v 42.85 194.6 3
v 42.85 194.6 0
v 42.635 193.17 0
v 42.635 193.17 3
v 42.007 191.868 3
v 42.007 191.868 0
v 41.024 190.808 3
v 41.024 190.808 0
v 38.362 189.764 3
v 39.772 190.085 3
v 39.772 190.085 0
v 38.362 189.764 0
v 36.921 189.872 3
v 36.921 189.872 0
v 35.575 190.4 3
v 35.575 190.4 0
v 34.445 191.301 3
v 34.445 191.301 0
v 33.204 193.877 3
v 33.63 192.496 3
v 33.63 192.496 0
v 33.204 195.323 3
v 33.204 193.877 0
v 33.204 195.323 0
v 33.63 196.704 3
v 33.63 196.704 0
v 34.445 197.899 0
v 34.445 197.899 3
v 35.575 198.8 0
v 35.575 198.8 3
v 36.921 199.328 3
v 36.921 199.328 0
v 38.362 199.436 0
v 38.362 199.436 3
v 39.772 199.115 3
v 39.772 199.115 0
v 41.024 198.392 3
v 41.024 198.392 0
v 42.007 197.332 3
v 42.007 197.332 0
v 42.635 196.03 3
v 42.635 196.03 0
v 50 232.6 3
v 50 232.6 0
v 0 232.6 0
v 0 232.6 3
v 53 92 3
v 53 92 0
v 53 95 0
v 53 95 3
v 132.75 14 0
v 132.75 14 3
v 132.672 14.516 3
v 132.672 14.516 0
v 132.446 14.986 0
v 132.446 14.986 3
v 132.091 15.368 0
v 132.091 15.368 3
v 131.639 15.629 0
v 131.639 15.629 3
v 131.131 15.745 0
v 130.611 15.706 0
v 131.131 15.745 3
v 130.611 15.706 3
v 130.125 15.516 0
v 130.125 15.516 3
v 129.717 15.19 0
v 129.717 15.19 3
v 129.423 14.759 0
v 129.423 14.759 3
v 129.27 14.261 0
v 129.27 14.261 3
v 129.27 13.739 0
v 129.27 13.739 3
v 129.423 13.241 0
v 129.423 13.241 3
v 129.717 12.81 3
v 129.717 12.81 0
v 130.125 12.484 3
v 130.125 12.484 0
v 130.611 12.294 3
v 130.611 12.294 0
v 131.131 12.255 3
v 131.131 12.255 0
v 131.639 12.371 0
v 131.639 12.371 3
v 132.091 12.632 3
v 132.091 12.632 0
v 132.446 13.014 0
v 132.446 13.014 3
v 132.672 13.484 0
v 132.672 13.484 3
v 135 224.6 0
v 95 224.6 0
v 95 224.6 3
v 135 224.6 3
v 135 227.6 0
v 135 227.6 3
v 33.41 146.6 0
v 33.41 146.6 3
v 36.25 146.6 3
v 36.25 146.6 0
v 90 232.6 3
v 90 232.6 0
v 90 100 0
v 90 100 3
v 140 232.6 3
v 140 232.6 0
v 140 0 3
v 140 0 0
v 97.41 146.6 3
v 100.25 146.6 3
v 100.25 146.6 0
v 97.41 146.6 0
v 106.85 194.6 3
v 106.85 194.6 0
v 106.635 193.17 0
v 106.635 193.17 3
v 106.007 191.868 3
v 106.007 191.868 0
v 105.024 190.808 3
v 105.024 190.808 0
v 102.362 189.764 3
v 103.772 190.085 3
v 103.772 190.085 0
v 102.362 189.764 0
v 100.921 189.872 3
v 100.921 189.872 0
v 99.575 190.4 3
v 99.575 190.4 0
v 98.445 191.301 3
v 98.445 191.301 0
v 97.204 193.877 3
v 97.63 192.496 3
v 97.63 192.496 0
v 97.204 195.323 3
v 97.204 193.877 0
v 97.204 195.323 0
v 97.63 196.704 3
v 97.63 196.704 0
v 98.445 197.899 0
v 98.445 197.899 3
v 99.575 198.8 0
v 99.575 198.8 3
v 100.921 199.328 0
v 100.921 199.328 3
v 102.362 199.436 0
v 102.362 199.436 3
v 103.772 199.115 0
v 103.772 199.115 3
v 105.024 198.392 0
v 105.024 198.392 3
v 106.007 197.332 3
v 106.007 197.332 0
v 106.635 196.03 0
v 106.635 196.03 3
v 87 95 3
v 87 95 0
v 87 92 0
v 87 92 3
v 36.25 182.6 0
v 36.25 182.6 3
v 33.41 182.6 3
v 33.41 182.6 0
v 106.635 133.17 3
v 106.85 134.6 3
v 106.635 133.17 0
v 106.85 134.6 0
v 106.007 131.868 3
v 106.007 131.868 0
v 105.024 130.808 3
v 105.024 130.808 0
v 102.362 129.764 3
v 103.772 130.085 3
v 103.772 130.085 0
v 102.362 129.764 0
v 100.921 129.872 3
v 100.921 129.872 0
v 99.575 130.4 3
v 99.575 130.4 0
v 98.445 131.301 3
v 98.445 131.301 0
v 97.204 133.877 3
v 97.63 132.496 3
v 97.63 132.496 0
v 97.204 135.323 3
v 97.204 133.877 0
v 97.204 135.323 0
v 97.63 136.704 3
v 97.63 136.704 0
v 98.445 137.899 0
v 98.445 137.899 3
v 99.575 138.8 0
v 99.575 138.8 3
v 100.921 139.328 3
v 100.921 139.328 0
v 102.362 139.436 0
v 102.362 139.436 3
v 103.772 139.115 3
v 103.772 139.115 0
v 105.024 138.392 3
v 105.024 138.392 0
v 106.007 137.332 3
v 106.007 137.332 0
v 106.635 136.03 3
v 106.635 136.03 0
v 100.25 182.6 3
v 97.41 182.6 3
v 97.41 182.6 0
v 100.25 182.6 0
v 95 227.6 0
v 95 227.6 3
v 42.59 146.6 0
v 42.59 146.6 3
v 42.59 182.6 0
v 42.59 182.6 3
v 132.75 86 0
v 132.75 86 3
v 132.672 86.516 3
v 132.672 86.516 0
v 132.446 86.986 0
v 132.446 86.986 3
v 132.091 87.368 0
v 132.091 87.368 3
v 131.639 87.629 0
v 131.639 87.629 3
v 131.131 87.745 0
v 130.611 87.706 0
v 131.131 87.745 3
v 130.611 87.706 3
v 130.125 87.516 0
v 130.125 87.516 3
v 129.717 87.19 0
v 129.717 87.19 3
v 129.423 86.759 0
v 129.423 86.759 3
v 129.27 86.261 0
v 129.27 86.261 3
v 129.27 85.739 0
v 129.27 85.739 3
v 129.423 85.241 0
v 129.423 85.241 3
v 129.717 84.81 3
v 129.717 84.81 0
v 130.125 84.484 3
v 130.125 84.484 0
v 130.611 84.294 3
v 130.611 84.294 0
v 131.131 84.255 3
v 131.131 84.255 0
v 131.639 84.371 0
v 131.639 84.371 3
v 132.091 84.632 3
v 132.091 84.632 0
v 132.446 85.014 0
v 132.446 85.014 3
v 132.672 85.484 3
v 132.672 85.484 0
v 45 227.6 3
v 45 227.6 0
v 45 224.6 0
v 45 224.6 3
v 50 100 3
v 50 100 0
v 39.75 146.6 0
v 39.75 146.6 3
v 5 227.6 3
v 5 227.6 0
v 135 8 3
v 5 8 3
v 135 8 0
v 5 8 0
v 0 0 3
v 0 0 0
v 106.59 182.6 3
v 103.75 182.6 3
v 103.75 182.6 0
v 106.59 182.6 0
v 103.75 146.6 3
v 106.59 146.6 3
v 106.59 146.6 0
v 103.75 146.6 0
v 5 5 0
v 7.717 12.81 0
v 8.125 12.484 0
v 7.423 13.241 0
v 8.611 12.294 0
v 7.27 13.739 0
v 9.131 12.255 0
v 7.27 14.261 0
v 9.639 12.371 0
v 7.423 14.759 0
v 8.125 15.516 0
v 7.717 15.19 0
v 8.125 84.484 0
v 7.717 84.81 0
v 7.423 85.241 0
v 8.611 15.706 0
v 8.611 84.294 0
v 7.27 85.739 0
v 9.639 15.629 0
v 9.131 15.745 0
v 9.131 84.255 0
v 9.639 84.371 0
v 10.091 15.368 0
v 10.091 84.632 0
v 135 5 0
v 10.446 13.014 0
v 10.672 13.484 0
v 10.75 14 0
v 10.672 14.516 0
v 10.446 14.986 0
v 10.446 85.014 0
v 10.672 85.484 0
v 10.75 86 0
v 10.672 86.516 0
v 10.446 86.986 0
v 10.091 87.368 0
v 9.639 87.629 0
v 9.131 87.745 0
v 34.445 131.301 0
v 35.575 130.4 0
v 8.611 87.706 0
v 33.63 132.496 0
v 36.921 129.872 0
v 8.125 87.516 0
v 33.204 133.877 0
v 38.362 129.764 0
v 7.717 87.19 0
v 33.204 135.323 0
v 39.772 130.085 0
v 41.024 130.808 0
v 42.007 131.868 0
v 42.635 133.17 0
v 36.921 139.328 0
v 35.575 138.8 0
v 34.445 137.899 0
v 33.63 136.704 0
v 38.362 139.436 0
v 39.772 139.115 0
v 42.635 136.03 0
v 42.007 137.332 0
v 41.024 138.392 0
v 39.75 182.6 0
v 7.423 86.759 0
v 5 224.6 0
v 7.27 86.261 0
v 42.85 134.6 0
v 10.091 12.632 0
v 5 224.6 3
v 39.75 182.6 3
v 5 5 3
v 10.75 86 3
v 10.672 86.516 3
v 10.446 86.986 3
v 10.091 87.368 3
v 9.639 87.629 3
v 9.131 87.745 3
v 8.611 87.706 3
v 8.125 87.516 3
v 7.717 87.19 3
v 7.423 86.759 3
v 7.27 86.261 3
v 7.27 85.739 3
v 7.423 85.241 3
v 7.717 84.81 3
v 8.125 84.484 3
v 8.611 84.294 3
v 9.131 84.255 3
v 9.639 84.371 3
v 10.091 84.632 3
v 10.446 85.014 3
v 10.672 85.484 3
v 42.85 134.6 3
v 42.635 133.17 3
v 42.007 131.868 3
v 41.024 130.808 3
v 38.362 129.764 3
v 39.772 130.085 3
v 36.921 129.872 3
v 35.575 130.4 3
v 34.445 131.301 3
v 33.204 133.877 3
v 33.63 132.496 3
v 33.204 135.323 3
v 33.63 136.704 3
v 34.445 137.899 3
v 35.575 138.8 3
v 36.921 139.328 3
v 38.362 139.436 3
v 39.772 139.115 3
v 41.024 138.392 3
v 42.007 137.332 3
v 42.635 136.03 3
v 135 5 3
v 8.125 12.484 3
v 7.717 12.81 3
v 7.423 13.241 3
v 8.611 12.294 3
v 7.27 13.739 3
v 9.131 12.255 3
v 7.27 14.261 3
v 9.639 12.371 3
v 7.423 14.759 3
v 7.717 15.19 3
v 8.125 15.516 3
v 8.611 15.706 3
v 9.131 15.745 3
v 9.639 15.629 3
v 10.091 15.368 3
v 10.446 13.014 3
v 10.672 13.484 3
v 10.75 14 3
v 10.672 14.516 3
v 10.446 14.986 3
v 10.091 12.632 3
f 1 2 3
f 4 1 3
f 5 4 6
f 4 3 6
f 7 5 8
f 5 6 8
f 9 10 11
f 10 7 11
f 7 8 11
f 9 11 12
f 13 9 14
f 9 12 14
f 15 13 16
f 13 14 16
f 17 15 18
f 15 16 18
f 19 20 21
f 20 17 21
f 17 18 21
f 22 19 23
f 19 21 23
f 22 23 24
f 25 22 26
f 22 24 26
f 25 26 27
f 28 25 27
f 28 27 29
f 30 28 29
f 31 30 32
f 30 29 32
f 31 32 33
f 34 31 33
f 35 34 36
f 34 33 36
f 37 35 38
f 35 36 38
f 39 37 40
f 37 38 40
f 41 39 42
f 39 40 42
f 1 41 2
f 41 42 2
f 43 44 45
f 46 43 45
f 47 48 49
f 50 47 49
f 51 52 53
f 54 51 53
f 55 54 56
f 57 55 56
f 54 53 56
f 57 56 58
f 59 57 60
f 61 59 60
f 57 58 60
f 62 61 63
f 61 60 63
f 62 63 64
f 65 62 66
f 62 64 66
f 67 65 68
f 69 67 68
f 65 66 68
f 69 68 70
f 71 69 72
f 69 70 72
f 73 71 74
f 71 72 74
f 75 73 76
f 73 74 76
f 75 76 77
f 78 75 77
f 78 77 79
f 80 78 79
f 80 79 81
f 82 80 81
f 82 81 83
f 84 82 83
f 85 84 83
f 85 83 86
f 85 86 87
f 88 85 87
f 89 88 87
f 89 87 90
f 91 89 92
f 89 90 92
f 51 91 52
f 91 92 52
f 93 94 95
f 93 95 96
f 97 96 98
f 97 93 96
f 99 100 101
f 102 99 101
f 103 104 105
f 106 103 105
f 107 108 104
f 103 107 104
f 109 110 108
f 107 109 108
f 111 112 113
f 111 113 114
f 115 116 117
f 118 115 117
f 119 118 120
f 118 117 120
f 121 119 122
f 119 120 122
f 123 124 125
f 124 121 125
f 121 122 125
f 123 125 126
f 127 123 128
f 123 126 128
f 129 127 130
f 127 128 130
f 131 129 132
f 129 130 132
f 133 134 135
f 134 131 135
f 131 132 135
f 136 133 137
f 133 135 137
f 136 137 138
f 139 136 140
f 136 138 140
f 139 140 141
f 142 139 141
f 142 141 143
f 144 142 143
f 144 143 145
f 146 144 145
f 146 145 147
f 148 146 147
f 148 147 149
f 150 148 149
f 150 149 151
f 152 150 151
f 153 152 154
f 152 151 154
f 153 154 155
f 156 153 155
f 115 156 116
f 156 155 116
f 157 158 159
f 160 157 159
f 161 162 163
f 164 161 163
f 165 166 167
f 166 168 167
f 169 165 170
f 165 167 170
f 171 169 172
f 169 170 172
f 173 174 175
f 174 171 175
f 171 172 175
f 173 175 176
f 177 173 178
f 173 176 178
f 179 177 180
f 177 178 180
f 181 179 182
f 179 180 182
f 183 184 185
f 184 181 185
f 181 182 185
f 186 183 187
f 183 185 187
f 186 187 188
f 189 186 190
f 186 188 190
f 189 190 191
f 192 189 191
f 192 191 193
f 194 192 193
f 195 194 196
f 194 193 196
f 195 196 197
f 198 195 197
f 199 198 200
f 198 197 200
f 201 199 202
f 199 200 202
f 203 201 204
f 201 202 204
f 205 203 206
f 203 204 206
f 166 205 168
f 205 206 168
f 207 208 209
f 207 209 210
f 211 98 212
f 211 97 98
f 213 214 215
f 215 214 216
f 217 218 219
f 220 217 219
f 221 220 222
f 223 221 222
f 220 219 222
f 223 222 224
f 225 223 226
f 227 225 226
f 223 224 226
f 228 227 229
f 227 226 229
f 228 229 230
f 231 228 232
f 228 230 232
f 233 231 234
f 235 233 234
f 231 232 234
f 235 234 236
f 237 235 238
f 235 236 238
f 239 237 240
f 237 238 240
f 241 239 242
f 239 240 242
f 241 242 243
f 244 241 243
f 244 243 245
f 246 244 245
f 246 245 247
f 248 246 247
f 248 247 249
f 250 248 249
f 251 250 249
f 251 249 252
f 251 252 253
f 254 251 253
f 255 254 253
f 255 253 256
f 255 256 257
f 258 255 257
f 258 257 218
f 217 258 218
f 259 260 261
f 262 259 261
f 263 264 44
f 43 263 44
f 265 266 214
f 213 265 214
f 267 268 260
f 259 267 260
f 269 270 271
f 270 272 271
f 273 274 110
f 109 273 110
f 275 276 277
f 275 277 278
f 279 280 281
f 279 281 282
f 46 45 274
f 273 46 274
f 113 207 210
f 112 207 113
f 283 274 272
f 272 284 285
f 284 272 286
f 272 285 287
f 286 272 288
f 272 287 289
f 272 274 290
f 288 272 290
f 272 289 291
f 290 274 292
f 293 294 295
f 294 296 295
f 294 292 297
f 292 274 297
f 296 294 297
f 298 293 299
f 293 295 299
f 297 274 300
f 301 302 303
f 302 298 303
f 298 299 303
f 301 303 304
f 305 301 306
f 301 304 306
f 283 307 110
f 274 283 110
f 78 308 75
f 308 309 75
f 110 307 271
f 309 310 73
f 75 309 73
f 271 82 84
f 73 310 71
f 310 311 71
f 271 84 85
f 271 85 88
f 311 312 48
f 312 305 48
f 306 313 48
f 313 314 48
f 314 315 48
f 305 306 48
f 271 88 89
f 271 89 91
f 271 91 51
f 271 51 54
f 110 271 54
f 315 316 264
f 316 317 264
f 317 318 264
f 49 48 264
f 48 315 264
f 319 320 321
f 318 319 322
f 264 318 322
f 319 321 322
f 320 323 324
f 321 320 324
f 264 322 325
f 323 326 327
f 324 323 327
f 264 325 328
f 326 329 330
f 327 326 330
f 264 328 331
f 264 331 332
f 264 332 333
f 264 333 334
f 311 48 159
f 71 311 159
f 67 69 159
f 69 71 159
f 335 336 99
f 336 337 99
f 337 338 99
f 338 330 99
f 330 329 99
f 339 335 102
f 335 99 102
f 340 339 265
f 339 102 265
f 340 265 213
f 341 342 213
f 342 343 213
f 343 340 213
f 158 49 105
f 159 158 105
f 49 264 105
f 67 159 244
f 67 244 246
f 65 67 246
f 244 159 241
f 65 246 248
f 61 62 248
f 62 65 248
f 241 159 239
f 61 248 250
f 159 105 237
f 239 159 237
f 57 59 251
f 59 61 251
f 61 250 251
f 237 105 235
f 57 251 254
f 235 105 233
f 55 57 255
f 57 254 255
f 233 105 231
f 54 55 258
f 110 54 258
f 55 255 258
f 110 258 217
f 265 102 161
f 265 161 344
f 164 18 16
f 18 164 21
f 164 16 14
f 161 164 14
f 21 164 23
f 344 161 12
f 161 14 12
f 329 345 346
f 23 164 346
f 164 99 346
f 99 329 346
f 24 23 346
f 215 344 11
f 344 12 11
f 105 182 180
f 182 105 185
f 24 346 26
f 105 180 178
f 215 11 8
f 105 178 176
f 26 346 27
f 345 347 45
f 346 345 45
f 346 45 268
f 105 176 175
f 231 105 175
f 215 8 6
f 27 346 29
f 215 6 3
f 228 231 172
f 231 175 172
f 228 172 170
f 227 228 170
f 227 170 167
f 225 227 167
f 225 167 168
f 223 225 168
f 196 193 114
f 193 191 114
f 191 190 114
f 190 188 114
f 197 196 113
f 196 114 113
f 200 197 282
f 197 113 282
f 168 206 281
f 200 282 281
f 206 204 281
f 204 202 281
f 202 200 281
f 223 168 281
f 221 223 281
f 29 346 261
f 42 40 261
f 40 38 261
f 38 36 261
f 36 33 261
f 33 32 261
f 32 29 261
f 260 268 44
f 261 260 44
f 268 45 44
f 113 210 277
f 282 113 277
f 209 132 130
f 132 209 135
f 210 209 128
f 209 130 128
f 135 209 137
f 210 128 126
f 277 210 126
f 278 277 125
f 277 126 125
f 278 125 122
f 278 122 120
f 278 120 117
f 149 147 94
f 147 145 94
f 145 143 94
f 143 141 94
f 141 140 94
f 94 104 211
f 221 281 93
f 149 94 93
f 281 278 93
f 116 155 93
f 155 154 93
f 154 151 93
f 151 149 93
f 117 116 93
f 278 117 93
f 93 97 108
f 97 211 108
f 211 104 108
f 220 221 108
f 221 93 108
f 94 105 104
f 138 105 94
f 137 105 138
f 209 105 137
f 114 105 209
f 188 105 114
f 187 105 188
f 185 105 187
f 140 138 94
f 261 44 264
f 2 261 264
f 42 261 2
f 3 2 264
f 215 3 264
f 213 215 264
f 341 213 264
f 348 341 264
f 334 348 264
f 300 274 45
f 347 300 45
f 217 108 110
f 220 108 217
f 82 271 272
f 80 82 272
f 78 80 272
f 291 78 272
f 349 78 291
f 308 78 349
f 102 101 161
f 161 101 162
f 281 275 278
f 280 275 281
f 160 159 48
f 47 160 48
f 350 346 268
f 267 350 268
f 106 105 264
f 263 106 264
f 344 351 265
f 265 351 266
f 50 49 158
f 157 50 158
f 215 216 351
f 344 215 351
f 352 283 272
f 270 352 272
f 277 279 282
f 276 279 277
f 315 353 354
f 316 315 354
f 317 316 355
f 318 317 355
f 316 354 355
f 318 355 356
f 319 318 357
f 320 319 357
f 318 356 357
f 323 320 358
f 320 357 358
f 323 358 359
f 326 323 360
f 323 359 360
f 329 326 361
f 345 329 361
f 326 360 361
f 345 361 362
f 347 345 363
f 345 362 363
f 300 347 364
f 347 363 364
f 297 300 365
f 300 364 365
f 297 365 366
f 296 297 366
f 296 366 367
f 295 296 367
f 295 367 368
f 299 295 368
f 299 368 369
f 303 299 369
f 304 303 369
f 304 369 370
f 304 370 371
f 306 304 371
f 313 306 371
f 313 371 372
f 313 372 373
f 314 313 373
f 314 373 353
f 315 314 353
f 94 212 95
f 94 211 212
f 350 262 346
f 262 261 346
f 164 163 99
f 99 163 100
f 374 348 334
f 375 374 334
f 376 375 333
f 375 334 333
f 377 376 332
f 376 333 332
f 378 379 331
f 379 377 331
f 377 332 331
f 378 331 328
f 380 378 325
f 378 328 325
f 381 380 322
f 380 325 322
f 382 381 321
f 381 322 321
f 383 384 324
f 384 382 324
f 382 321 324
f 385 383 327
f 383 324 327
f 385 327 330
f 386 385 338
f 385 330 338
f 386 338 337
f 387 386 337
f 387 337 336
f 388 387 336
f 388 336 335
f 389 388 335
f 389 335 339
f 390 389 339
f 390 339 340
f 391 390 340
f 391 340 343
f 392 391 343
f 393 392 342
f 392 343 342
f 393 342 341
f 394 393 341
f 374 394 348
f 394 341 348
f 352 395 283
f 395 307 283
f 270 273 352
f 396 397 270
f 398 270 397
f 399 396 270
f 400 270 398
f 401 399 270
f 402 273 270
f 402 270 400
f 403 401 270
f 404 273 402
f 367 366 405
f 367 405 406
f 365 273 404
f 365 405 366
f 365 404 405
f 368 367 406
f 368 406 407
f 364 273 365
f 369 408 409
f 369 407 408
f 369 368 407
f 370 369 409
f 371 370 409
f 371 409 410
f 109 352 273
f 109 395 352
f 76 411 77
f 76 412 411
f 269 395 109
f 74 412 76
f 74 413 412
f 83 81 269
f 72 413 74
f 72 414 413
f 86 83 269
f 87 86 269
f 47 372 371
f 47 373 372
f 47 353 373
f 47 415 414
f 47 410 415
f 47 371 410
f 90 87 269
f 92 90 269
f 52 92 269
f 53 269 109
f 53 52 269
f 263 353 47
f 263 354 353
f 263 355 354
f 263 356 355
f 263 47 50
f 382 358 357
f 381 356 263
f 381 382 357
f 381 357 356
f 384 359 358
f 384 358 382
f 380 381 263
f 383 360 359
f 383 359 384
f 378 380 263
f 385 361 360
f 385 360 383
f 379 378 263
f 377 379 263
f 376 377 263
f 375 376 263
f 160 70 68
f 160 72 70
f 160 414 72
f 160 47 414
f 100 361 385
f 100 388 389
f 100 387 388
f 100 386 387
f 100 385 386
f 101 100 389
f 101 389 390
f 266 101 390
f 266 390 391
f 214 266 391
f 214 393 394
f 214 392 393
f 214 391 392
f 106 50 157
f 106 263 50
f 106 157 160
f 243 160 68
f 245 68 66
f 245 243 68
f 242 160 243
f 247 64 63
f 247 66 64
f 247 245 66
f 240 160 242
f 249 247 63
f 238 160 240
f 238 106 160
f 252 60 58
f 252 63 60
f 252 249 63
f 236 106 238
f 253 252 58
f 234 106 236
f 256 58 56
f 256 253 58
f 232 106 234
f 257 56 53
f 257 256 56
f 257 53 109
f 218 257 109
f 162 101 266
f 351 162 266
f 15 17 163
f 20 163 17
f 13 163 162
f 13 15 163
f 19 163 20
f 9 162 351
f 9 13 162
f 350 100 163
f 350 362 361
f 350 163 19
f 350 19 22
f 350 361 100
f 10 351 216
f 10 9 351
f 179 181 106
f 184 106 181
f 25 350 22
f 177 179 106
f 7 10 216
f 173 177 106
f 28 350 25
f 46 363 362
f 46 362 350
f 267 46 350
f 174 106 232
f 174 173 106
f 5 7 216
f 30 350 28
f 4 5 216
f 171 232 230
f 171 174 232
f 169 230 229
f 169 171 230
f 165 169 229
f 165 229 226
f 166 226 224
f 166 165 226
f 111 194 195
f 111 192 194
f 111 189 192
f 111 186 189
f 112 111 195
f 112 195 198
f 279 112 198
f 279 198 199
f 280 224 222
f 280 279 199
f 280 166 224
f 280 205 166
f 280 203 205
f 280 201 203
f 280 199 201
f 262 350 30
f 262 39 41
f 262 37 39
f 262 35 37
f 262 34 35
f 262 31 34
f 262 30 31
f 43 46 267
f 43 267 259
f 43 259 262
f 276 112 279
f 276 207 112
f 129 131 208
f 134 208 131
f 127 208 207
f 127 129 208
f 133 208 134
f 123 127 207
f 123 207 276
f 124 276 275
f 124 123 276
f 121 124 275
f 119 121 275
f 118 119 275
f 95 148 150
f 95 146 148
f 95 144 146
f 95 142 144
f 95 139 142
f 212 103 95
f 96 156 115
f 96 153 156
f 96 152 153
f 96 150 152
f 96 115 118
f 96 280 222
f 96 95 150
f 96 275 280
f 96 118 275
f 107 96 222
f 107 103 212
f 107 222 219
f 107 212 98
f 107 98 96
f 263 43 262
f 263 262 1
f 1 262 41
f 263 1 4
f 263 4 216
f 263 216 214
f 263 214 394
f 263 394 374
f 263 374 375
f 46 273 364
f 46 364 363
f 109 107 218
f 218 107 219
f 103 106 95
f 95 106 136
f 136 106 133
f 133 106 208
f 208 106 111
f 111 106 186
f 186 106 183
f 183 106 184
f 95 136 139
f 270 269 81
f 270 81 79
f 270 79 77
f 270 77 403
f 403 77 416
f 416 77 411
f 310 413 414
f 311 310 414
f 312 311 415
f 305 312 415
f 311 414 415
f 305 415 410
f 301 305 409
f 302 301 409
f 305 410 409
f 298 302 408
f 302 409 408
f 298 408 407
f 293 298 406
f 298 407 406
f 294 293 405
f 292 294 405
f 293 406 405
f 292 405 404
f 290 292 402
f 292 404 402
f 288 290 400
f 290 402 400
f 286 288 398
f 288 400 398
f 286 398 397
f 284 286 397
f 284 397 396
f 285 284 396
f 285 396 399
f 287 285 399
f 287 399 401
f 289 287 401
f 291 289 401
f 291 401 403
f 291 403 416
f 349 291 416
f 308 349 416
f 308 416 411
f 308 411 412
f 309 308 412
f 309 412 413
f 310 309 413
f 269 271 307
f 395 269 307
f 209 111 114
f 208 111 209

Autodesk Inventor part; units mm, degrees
ref_plane "YZ Plane" through (0, 0, 0) normal (1, 0, 0) x (0, 1, 0)
ref_plane "XZ Plane" through (0, 0, 0) normal (0, 1, 0) x (-1, 0, 0)
ref_plane "XY Plane" through (0, 0, 0) normal (0, 0, 1) x (1, 0, 0)
sketch "Sketch1" plane through (0, 0, 0) normal (0, 0, 1) x (1, 0, 0)
  line L0 (0, 0) -> (140, 0)
  line L1 (140, 0) -> (140, 232.6)
  line L2 (140, 232.6) -> (90, 232.6)
  line L3 (90, 232.6) -> (90, 100)
  line L4 (90, 100) -> (50, 100)
  line L5 (50, 100) -> (50, 232.6)
  line L6 (50, 232.6) -> (0, 232.6)
  line L7 (0, 232.6) -> (0, 0)
  line L8 (70, 100) -> (70, 0) construction
  line L9 (30, 232.2963) -> (30, 0) construction
  circle A0 centre (38, 194.6) radius 4.85
  circle A1 centre (38, 134.6) radius 4.85
  circle A2 centre (102, 194.6) radius 4.85
  circle A3 centre (102, 134.6) radius 4.85
  circle A4 centre (30, 194.6) radius 14 construction
  circle A5 centre (30, 134.6) radius 14 construction
  line L10 (5, 227.6) -> (45, 227.6)
  line L11 (45, 227.6) -> (45, 224.6)
  line L12 (45, 224.6) -> (5, 224.6)
  line L13 (5, 224.6) -> (5, 227.6)
  line L14 (53, 95) -> (87, 95)
  line L15 (87, 95) -> (87, 92)
  line L16 (87, 92) -> (53, 92)
  line L17 (53, 92) -> (53, 95)
  line L18 (5, 8) -> (135, 8)
  line L19 (135, 8) -> (135, 5)
  line L20 (135, 5) -> (5, 5)
  line L21 (5, 5) -> (5, 8)
  line L22 (135, 227.6) -> (95, 227.6)
  line L23 (95, 227.6) -> (95, 224.6)
  line L24 (95, 224.6) -> (135, 224.6)
  line L25 (135, 224.6) -> (135, 227.6)
  line L26 (30, 194.6) -> (50, 194.6) construction
  line L27 (30, 134.6) -> (50, 134.6) construction
  circle A6 centre (30, 202.6) radius 4.5
  dimension "d0" = 40
  dimension "d2" = 132.6
  dimension "d3" = 100
  dimension "d4" = 9.7
  dimension "d6" = 60
  dimension "d10" = 28
  dimension "d11" = 8
  dimension "d12" = 8
  dimension "d13" = 5
  dimension "d14" = 5
  dimension "d15" = 5
  dimension "d16" = 3
  dimension "d17" = 3
  dimension "d18" = 5
  dimension "d19" = 3
  dimension "d20" = 3
  dimension "d21" = 5
  dimension "d22" = 5
  dimension "d23" = 5
  dimension "d24" = 3
  dimension "d32" = 9
  dimension "d33" = 8
  dimension "d34" = 30
  dimension "d39" = 20
  dimension "d40" = 50
extrude "Extrusion2" add sketch "Sketch1" along normal blind 3 contours L7 L6 L5 L4 L3 L2 L1 L0 | A6
sketch "Sketch2" plane through (0, 0, 3) normal (0, 0, 1) x (1, 0, 0)
  circle A0 centre (38, 194.6) radius 4.85 construction
  line L0 (50, 232.6) -> (0, 232.6) construction
  line L1 (50, 232.6) -> (0, 232.6) construction
  line L2 (36.25, 182.6) -> (33.41, 182.6)
  line L3 (33.41, 182.6) -> (33.41, 146.6)
  line L4 (33.41, 146.6) -> (36.25, 146.6)
  line L5 (36.25, 146.6) -> (36.25, 182.6)
  line L6 (90, 100) -> (50, 100) construction
  line L7 (70, 100) -> (70, 0) construction
  line L8 (39.75, 146.6) -> (42.59, 146.6)
  line L9 (42.59, 146.6) -> (42.59, 182.6)
  line L10 (42.59, 182.6) -> (39.75, 182.6)
  line L11 (39.75, 182.6) -> (39.75, 146.6)
  line L12 (103.75, 182.6) -> (106.59, 182.6)
  line L13 (106.59, 182.6) -> (106.59, 146.6)
  line L14 (106.59, 146.6) -> (103.75, 146.6)
  line L15 (103.75, 146.6) -> (103.75, 182.6)
  line L16 (100.25, 146.6) -> (97.41, 146.6)
  line L17 (97.41, 146.6) -> (97.41, 182.6)
  line L18 (97.41, 182.6) -> (100.25, 182.6)
  line L19 (100.25, 182.6) -> (100.25, 146.6)
  line L20 (33.41, 164.6) -> (7.5179, 164.6)
  circle A1 centre (38, 134.6) radius 4.85 construction
  line L21 (38, 134.6) -> (38, 194.6)
  line L22 (38, 164.6) -> (28.9281, 164.6)
  point P0 (0, 0)
  dimension "d28" = 2.84
  dimension "d31" = 36
  dimension "d35" = 1.75
  dimension "d36" = 3.5
extrude "Extrusion3" cut sketch "Sketch2" against normal blind 3
sketch "Sketch3" plane through (0, 0, 3) normal (0, 0, 1) x (1, 0, 0)
  line L0 (5, 90) -> (135, 90)
  line L1 (135, 90) -> (135, 10)
  line L2 (135, 10) -> (5, 10)
  line L3 (5, 10) -> (5, 90)
  line L4 (5, 8) -> (135, 8) construction
  line L5 (5, 8) -> (135, 8) construction
  line L6 (135, 8) -> (135, 92) construction
  line L7 (135, 92) -> (5, 92) construction
  line L8 (5, 92) -> (5, 8) construction
  line L9 (87, 92) -> (53, 92) construction
  line L10 (135, 8) -> (135, 5) construction
  line L11 (5, 92) -> (135, 8) construction
  line L12 (5, 8) -> (135, 92) construction
  line L13 (5, 90) -> (135, 10) construction
  line L14 (5, 10) -> (135, 90) construction
  circle A0 centre (9, 86) radius 1.75
  line L15 (70, 50) -> (70, 68.0363) construction
  line L16 (70, 50) -> (82.7907, 50) construction
  circle A1 centre (131, 86) radius 1.75
  circle A2 centre (9, 14) radius 1.75
  circle A3 centre (131, 14) radius 1.75
  point P0 (0, 0)
  dimension "d37" = 130
  dimension "d38" = 80
  dimension "d41" = 3.5
  dimension "d42" = 4
  dimension "d43" = 4
extrude "Extrusion4" cut sketch "Sketch3" against normal blind 10 contours A0 | A1 | A2 | A3
equation "\"d0\" = 0.5 * marshdistance"
equation "\"d2\" = sidewallL"
equation "\"d3\" = Uthick"
equation "\"d6\" = marshmarshD"
equation "\"d34\" = marshedgeD"
equation "\"d39\" = 0.5 * Utip"
equation "\"d35\" = 0.5 * stickL"
equation "\"d36\" = stickL"
equation "\"d43\" = d42"
equation "\"thick\" = 0.5"
equation "\"lrlr\" = 19"
equation "\"lrmid\" = 19.9"
equation "\"lrdepth\" = 3.3"
equation "\"mlr\" = 16.6"
equation "\"mmid\" = 24.7"
equation "\"mdepth\" = 4.5"
equation "\"lrltotal\" = 126.6"
equation "\"mltotal\" = 126.6"
equation "\"lrbetween\" = 52.1"
equation "\"mbetween\" = 49.5"
equation "\"toler\" = 1"
equation "\"tight\" = 0.08"
equation "\"stuckw\" = 6"
equation "\"sidewallL\" = 132.6"
equation "\"heaterH\" = 117.3"
equation "\"Uthick\" = 100"
equation "\"marshmarshD\" = 60"
equation "\"marshedgeD\" = 30"
equation "\"stickL\" = 3.5"
equation "\"wireH\" = 25"
equation "\"marshdistance\" = 80"
equation "\"Utip\" = 40"
properties part number "Ushape_top"
